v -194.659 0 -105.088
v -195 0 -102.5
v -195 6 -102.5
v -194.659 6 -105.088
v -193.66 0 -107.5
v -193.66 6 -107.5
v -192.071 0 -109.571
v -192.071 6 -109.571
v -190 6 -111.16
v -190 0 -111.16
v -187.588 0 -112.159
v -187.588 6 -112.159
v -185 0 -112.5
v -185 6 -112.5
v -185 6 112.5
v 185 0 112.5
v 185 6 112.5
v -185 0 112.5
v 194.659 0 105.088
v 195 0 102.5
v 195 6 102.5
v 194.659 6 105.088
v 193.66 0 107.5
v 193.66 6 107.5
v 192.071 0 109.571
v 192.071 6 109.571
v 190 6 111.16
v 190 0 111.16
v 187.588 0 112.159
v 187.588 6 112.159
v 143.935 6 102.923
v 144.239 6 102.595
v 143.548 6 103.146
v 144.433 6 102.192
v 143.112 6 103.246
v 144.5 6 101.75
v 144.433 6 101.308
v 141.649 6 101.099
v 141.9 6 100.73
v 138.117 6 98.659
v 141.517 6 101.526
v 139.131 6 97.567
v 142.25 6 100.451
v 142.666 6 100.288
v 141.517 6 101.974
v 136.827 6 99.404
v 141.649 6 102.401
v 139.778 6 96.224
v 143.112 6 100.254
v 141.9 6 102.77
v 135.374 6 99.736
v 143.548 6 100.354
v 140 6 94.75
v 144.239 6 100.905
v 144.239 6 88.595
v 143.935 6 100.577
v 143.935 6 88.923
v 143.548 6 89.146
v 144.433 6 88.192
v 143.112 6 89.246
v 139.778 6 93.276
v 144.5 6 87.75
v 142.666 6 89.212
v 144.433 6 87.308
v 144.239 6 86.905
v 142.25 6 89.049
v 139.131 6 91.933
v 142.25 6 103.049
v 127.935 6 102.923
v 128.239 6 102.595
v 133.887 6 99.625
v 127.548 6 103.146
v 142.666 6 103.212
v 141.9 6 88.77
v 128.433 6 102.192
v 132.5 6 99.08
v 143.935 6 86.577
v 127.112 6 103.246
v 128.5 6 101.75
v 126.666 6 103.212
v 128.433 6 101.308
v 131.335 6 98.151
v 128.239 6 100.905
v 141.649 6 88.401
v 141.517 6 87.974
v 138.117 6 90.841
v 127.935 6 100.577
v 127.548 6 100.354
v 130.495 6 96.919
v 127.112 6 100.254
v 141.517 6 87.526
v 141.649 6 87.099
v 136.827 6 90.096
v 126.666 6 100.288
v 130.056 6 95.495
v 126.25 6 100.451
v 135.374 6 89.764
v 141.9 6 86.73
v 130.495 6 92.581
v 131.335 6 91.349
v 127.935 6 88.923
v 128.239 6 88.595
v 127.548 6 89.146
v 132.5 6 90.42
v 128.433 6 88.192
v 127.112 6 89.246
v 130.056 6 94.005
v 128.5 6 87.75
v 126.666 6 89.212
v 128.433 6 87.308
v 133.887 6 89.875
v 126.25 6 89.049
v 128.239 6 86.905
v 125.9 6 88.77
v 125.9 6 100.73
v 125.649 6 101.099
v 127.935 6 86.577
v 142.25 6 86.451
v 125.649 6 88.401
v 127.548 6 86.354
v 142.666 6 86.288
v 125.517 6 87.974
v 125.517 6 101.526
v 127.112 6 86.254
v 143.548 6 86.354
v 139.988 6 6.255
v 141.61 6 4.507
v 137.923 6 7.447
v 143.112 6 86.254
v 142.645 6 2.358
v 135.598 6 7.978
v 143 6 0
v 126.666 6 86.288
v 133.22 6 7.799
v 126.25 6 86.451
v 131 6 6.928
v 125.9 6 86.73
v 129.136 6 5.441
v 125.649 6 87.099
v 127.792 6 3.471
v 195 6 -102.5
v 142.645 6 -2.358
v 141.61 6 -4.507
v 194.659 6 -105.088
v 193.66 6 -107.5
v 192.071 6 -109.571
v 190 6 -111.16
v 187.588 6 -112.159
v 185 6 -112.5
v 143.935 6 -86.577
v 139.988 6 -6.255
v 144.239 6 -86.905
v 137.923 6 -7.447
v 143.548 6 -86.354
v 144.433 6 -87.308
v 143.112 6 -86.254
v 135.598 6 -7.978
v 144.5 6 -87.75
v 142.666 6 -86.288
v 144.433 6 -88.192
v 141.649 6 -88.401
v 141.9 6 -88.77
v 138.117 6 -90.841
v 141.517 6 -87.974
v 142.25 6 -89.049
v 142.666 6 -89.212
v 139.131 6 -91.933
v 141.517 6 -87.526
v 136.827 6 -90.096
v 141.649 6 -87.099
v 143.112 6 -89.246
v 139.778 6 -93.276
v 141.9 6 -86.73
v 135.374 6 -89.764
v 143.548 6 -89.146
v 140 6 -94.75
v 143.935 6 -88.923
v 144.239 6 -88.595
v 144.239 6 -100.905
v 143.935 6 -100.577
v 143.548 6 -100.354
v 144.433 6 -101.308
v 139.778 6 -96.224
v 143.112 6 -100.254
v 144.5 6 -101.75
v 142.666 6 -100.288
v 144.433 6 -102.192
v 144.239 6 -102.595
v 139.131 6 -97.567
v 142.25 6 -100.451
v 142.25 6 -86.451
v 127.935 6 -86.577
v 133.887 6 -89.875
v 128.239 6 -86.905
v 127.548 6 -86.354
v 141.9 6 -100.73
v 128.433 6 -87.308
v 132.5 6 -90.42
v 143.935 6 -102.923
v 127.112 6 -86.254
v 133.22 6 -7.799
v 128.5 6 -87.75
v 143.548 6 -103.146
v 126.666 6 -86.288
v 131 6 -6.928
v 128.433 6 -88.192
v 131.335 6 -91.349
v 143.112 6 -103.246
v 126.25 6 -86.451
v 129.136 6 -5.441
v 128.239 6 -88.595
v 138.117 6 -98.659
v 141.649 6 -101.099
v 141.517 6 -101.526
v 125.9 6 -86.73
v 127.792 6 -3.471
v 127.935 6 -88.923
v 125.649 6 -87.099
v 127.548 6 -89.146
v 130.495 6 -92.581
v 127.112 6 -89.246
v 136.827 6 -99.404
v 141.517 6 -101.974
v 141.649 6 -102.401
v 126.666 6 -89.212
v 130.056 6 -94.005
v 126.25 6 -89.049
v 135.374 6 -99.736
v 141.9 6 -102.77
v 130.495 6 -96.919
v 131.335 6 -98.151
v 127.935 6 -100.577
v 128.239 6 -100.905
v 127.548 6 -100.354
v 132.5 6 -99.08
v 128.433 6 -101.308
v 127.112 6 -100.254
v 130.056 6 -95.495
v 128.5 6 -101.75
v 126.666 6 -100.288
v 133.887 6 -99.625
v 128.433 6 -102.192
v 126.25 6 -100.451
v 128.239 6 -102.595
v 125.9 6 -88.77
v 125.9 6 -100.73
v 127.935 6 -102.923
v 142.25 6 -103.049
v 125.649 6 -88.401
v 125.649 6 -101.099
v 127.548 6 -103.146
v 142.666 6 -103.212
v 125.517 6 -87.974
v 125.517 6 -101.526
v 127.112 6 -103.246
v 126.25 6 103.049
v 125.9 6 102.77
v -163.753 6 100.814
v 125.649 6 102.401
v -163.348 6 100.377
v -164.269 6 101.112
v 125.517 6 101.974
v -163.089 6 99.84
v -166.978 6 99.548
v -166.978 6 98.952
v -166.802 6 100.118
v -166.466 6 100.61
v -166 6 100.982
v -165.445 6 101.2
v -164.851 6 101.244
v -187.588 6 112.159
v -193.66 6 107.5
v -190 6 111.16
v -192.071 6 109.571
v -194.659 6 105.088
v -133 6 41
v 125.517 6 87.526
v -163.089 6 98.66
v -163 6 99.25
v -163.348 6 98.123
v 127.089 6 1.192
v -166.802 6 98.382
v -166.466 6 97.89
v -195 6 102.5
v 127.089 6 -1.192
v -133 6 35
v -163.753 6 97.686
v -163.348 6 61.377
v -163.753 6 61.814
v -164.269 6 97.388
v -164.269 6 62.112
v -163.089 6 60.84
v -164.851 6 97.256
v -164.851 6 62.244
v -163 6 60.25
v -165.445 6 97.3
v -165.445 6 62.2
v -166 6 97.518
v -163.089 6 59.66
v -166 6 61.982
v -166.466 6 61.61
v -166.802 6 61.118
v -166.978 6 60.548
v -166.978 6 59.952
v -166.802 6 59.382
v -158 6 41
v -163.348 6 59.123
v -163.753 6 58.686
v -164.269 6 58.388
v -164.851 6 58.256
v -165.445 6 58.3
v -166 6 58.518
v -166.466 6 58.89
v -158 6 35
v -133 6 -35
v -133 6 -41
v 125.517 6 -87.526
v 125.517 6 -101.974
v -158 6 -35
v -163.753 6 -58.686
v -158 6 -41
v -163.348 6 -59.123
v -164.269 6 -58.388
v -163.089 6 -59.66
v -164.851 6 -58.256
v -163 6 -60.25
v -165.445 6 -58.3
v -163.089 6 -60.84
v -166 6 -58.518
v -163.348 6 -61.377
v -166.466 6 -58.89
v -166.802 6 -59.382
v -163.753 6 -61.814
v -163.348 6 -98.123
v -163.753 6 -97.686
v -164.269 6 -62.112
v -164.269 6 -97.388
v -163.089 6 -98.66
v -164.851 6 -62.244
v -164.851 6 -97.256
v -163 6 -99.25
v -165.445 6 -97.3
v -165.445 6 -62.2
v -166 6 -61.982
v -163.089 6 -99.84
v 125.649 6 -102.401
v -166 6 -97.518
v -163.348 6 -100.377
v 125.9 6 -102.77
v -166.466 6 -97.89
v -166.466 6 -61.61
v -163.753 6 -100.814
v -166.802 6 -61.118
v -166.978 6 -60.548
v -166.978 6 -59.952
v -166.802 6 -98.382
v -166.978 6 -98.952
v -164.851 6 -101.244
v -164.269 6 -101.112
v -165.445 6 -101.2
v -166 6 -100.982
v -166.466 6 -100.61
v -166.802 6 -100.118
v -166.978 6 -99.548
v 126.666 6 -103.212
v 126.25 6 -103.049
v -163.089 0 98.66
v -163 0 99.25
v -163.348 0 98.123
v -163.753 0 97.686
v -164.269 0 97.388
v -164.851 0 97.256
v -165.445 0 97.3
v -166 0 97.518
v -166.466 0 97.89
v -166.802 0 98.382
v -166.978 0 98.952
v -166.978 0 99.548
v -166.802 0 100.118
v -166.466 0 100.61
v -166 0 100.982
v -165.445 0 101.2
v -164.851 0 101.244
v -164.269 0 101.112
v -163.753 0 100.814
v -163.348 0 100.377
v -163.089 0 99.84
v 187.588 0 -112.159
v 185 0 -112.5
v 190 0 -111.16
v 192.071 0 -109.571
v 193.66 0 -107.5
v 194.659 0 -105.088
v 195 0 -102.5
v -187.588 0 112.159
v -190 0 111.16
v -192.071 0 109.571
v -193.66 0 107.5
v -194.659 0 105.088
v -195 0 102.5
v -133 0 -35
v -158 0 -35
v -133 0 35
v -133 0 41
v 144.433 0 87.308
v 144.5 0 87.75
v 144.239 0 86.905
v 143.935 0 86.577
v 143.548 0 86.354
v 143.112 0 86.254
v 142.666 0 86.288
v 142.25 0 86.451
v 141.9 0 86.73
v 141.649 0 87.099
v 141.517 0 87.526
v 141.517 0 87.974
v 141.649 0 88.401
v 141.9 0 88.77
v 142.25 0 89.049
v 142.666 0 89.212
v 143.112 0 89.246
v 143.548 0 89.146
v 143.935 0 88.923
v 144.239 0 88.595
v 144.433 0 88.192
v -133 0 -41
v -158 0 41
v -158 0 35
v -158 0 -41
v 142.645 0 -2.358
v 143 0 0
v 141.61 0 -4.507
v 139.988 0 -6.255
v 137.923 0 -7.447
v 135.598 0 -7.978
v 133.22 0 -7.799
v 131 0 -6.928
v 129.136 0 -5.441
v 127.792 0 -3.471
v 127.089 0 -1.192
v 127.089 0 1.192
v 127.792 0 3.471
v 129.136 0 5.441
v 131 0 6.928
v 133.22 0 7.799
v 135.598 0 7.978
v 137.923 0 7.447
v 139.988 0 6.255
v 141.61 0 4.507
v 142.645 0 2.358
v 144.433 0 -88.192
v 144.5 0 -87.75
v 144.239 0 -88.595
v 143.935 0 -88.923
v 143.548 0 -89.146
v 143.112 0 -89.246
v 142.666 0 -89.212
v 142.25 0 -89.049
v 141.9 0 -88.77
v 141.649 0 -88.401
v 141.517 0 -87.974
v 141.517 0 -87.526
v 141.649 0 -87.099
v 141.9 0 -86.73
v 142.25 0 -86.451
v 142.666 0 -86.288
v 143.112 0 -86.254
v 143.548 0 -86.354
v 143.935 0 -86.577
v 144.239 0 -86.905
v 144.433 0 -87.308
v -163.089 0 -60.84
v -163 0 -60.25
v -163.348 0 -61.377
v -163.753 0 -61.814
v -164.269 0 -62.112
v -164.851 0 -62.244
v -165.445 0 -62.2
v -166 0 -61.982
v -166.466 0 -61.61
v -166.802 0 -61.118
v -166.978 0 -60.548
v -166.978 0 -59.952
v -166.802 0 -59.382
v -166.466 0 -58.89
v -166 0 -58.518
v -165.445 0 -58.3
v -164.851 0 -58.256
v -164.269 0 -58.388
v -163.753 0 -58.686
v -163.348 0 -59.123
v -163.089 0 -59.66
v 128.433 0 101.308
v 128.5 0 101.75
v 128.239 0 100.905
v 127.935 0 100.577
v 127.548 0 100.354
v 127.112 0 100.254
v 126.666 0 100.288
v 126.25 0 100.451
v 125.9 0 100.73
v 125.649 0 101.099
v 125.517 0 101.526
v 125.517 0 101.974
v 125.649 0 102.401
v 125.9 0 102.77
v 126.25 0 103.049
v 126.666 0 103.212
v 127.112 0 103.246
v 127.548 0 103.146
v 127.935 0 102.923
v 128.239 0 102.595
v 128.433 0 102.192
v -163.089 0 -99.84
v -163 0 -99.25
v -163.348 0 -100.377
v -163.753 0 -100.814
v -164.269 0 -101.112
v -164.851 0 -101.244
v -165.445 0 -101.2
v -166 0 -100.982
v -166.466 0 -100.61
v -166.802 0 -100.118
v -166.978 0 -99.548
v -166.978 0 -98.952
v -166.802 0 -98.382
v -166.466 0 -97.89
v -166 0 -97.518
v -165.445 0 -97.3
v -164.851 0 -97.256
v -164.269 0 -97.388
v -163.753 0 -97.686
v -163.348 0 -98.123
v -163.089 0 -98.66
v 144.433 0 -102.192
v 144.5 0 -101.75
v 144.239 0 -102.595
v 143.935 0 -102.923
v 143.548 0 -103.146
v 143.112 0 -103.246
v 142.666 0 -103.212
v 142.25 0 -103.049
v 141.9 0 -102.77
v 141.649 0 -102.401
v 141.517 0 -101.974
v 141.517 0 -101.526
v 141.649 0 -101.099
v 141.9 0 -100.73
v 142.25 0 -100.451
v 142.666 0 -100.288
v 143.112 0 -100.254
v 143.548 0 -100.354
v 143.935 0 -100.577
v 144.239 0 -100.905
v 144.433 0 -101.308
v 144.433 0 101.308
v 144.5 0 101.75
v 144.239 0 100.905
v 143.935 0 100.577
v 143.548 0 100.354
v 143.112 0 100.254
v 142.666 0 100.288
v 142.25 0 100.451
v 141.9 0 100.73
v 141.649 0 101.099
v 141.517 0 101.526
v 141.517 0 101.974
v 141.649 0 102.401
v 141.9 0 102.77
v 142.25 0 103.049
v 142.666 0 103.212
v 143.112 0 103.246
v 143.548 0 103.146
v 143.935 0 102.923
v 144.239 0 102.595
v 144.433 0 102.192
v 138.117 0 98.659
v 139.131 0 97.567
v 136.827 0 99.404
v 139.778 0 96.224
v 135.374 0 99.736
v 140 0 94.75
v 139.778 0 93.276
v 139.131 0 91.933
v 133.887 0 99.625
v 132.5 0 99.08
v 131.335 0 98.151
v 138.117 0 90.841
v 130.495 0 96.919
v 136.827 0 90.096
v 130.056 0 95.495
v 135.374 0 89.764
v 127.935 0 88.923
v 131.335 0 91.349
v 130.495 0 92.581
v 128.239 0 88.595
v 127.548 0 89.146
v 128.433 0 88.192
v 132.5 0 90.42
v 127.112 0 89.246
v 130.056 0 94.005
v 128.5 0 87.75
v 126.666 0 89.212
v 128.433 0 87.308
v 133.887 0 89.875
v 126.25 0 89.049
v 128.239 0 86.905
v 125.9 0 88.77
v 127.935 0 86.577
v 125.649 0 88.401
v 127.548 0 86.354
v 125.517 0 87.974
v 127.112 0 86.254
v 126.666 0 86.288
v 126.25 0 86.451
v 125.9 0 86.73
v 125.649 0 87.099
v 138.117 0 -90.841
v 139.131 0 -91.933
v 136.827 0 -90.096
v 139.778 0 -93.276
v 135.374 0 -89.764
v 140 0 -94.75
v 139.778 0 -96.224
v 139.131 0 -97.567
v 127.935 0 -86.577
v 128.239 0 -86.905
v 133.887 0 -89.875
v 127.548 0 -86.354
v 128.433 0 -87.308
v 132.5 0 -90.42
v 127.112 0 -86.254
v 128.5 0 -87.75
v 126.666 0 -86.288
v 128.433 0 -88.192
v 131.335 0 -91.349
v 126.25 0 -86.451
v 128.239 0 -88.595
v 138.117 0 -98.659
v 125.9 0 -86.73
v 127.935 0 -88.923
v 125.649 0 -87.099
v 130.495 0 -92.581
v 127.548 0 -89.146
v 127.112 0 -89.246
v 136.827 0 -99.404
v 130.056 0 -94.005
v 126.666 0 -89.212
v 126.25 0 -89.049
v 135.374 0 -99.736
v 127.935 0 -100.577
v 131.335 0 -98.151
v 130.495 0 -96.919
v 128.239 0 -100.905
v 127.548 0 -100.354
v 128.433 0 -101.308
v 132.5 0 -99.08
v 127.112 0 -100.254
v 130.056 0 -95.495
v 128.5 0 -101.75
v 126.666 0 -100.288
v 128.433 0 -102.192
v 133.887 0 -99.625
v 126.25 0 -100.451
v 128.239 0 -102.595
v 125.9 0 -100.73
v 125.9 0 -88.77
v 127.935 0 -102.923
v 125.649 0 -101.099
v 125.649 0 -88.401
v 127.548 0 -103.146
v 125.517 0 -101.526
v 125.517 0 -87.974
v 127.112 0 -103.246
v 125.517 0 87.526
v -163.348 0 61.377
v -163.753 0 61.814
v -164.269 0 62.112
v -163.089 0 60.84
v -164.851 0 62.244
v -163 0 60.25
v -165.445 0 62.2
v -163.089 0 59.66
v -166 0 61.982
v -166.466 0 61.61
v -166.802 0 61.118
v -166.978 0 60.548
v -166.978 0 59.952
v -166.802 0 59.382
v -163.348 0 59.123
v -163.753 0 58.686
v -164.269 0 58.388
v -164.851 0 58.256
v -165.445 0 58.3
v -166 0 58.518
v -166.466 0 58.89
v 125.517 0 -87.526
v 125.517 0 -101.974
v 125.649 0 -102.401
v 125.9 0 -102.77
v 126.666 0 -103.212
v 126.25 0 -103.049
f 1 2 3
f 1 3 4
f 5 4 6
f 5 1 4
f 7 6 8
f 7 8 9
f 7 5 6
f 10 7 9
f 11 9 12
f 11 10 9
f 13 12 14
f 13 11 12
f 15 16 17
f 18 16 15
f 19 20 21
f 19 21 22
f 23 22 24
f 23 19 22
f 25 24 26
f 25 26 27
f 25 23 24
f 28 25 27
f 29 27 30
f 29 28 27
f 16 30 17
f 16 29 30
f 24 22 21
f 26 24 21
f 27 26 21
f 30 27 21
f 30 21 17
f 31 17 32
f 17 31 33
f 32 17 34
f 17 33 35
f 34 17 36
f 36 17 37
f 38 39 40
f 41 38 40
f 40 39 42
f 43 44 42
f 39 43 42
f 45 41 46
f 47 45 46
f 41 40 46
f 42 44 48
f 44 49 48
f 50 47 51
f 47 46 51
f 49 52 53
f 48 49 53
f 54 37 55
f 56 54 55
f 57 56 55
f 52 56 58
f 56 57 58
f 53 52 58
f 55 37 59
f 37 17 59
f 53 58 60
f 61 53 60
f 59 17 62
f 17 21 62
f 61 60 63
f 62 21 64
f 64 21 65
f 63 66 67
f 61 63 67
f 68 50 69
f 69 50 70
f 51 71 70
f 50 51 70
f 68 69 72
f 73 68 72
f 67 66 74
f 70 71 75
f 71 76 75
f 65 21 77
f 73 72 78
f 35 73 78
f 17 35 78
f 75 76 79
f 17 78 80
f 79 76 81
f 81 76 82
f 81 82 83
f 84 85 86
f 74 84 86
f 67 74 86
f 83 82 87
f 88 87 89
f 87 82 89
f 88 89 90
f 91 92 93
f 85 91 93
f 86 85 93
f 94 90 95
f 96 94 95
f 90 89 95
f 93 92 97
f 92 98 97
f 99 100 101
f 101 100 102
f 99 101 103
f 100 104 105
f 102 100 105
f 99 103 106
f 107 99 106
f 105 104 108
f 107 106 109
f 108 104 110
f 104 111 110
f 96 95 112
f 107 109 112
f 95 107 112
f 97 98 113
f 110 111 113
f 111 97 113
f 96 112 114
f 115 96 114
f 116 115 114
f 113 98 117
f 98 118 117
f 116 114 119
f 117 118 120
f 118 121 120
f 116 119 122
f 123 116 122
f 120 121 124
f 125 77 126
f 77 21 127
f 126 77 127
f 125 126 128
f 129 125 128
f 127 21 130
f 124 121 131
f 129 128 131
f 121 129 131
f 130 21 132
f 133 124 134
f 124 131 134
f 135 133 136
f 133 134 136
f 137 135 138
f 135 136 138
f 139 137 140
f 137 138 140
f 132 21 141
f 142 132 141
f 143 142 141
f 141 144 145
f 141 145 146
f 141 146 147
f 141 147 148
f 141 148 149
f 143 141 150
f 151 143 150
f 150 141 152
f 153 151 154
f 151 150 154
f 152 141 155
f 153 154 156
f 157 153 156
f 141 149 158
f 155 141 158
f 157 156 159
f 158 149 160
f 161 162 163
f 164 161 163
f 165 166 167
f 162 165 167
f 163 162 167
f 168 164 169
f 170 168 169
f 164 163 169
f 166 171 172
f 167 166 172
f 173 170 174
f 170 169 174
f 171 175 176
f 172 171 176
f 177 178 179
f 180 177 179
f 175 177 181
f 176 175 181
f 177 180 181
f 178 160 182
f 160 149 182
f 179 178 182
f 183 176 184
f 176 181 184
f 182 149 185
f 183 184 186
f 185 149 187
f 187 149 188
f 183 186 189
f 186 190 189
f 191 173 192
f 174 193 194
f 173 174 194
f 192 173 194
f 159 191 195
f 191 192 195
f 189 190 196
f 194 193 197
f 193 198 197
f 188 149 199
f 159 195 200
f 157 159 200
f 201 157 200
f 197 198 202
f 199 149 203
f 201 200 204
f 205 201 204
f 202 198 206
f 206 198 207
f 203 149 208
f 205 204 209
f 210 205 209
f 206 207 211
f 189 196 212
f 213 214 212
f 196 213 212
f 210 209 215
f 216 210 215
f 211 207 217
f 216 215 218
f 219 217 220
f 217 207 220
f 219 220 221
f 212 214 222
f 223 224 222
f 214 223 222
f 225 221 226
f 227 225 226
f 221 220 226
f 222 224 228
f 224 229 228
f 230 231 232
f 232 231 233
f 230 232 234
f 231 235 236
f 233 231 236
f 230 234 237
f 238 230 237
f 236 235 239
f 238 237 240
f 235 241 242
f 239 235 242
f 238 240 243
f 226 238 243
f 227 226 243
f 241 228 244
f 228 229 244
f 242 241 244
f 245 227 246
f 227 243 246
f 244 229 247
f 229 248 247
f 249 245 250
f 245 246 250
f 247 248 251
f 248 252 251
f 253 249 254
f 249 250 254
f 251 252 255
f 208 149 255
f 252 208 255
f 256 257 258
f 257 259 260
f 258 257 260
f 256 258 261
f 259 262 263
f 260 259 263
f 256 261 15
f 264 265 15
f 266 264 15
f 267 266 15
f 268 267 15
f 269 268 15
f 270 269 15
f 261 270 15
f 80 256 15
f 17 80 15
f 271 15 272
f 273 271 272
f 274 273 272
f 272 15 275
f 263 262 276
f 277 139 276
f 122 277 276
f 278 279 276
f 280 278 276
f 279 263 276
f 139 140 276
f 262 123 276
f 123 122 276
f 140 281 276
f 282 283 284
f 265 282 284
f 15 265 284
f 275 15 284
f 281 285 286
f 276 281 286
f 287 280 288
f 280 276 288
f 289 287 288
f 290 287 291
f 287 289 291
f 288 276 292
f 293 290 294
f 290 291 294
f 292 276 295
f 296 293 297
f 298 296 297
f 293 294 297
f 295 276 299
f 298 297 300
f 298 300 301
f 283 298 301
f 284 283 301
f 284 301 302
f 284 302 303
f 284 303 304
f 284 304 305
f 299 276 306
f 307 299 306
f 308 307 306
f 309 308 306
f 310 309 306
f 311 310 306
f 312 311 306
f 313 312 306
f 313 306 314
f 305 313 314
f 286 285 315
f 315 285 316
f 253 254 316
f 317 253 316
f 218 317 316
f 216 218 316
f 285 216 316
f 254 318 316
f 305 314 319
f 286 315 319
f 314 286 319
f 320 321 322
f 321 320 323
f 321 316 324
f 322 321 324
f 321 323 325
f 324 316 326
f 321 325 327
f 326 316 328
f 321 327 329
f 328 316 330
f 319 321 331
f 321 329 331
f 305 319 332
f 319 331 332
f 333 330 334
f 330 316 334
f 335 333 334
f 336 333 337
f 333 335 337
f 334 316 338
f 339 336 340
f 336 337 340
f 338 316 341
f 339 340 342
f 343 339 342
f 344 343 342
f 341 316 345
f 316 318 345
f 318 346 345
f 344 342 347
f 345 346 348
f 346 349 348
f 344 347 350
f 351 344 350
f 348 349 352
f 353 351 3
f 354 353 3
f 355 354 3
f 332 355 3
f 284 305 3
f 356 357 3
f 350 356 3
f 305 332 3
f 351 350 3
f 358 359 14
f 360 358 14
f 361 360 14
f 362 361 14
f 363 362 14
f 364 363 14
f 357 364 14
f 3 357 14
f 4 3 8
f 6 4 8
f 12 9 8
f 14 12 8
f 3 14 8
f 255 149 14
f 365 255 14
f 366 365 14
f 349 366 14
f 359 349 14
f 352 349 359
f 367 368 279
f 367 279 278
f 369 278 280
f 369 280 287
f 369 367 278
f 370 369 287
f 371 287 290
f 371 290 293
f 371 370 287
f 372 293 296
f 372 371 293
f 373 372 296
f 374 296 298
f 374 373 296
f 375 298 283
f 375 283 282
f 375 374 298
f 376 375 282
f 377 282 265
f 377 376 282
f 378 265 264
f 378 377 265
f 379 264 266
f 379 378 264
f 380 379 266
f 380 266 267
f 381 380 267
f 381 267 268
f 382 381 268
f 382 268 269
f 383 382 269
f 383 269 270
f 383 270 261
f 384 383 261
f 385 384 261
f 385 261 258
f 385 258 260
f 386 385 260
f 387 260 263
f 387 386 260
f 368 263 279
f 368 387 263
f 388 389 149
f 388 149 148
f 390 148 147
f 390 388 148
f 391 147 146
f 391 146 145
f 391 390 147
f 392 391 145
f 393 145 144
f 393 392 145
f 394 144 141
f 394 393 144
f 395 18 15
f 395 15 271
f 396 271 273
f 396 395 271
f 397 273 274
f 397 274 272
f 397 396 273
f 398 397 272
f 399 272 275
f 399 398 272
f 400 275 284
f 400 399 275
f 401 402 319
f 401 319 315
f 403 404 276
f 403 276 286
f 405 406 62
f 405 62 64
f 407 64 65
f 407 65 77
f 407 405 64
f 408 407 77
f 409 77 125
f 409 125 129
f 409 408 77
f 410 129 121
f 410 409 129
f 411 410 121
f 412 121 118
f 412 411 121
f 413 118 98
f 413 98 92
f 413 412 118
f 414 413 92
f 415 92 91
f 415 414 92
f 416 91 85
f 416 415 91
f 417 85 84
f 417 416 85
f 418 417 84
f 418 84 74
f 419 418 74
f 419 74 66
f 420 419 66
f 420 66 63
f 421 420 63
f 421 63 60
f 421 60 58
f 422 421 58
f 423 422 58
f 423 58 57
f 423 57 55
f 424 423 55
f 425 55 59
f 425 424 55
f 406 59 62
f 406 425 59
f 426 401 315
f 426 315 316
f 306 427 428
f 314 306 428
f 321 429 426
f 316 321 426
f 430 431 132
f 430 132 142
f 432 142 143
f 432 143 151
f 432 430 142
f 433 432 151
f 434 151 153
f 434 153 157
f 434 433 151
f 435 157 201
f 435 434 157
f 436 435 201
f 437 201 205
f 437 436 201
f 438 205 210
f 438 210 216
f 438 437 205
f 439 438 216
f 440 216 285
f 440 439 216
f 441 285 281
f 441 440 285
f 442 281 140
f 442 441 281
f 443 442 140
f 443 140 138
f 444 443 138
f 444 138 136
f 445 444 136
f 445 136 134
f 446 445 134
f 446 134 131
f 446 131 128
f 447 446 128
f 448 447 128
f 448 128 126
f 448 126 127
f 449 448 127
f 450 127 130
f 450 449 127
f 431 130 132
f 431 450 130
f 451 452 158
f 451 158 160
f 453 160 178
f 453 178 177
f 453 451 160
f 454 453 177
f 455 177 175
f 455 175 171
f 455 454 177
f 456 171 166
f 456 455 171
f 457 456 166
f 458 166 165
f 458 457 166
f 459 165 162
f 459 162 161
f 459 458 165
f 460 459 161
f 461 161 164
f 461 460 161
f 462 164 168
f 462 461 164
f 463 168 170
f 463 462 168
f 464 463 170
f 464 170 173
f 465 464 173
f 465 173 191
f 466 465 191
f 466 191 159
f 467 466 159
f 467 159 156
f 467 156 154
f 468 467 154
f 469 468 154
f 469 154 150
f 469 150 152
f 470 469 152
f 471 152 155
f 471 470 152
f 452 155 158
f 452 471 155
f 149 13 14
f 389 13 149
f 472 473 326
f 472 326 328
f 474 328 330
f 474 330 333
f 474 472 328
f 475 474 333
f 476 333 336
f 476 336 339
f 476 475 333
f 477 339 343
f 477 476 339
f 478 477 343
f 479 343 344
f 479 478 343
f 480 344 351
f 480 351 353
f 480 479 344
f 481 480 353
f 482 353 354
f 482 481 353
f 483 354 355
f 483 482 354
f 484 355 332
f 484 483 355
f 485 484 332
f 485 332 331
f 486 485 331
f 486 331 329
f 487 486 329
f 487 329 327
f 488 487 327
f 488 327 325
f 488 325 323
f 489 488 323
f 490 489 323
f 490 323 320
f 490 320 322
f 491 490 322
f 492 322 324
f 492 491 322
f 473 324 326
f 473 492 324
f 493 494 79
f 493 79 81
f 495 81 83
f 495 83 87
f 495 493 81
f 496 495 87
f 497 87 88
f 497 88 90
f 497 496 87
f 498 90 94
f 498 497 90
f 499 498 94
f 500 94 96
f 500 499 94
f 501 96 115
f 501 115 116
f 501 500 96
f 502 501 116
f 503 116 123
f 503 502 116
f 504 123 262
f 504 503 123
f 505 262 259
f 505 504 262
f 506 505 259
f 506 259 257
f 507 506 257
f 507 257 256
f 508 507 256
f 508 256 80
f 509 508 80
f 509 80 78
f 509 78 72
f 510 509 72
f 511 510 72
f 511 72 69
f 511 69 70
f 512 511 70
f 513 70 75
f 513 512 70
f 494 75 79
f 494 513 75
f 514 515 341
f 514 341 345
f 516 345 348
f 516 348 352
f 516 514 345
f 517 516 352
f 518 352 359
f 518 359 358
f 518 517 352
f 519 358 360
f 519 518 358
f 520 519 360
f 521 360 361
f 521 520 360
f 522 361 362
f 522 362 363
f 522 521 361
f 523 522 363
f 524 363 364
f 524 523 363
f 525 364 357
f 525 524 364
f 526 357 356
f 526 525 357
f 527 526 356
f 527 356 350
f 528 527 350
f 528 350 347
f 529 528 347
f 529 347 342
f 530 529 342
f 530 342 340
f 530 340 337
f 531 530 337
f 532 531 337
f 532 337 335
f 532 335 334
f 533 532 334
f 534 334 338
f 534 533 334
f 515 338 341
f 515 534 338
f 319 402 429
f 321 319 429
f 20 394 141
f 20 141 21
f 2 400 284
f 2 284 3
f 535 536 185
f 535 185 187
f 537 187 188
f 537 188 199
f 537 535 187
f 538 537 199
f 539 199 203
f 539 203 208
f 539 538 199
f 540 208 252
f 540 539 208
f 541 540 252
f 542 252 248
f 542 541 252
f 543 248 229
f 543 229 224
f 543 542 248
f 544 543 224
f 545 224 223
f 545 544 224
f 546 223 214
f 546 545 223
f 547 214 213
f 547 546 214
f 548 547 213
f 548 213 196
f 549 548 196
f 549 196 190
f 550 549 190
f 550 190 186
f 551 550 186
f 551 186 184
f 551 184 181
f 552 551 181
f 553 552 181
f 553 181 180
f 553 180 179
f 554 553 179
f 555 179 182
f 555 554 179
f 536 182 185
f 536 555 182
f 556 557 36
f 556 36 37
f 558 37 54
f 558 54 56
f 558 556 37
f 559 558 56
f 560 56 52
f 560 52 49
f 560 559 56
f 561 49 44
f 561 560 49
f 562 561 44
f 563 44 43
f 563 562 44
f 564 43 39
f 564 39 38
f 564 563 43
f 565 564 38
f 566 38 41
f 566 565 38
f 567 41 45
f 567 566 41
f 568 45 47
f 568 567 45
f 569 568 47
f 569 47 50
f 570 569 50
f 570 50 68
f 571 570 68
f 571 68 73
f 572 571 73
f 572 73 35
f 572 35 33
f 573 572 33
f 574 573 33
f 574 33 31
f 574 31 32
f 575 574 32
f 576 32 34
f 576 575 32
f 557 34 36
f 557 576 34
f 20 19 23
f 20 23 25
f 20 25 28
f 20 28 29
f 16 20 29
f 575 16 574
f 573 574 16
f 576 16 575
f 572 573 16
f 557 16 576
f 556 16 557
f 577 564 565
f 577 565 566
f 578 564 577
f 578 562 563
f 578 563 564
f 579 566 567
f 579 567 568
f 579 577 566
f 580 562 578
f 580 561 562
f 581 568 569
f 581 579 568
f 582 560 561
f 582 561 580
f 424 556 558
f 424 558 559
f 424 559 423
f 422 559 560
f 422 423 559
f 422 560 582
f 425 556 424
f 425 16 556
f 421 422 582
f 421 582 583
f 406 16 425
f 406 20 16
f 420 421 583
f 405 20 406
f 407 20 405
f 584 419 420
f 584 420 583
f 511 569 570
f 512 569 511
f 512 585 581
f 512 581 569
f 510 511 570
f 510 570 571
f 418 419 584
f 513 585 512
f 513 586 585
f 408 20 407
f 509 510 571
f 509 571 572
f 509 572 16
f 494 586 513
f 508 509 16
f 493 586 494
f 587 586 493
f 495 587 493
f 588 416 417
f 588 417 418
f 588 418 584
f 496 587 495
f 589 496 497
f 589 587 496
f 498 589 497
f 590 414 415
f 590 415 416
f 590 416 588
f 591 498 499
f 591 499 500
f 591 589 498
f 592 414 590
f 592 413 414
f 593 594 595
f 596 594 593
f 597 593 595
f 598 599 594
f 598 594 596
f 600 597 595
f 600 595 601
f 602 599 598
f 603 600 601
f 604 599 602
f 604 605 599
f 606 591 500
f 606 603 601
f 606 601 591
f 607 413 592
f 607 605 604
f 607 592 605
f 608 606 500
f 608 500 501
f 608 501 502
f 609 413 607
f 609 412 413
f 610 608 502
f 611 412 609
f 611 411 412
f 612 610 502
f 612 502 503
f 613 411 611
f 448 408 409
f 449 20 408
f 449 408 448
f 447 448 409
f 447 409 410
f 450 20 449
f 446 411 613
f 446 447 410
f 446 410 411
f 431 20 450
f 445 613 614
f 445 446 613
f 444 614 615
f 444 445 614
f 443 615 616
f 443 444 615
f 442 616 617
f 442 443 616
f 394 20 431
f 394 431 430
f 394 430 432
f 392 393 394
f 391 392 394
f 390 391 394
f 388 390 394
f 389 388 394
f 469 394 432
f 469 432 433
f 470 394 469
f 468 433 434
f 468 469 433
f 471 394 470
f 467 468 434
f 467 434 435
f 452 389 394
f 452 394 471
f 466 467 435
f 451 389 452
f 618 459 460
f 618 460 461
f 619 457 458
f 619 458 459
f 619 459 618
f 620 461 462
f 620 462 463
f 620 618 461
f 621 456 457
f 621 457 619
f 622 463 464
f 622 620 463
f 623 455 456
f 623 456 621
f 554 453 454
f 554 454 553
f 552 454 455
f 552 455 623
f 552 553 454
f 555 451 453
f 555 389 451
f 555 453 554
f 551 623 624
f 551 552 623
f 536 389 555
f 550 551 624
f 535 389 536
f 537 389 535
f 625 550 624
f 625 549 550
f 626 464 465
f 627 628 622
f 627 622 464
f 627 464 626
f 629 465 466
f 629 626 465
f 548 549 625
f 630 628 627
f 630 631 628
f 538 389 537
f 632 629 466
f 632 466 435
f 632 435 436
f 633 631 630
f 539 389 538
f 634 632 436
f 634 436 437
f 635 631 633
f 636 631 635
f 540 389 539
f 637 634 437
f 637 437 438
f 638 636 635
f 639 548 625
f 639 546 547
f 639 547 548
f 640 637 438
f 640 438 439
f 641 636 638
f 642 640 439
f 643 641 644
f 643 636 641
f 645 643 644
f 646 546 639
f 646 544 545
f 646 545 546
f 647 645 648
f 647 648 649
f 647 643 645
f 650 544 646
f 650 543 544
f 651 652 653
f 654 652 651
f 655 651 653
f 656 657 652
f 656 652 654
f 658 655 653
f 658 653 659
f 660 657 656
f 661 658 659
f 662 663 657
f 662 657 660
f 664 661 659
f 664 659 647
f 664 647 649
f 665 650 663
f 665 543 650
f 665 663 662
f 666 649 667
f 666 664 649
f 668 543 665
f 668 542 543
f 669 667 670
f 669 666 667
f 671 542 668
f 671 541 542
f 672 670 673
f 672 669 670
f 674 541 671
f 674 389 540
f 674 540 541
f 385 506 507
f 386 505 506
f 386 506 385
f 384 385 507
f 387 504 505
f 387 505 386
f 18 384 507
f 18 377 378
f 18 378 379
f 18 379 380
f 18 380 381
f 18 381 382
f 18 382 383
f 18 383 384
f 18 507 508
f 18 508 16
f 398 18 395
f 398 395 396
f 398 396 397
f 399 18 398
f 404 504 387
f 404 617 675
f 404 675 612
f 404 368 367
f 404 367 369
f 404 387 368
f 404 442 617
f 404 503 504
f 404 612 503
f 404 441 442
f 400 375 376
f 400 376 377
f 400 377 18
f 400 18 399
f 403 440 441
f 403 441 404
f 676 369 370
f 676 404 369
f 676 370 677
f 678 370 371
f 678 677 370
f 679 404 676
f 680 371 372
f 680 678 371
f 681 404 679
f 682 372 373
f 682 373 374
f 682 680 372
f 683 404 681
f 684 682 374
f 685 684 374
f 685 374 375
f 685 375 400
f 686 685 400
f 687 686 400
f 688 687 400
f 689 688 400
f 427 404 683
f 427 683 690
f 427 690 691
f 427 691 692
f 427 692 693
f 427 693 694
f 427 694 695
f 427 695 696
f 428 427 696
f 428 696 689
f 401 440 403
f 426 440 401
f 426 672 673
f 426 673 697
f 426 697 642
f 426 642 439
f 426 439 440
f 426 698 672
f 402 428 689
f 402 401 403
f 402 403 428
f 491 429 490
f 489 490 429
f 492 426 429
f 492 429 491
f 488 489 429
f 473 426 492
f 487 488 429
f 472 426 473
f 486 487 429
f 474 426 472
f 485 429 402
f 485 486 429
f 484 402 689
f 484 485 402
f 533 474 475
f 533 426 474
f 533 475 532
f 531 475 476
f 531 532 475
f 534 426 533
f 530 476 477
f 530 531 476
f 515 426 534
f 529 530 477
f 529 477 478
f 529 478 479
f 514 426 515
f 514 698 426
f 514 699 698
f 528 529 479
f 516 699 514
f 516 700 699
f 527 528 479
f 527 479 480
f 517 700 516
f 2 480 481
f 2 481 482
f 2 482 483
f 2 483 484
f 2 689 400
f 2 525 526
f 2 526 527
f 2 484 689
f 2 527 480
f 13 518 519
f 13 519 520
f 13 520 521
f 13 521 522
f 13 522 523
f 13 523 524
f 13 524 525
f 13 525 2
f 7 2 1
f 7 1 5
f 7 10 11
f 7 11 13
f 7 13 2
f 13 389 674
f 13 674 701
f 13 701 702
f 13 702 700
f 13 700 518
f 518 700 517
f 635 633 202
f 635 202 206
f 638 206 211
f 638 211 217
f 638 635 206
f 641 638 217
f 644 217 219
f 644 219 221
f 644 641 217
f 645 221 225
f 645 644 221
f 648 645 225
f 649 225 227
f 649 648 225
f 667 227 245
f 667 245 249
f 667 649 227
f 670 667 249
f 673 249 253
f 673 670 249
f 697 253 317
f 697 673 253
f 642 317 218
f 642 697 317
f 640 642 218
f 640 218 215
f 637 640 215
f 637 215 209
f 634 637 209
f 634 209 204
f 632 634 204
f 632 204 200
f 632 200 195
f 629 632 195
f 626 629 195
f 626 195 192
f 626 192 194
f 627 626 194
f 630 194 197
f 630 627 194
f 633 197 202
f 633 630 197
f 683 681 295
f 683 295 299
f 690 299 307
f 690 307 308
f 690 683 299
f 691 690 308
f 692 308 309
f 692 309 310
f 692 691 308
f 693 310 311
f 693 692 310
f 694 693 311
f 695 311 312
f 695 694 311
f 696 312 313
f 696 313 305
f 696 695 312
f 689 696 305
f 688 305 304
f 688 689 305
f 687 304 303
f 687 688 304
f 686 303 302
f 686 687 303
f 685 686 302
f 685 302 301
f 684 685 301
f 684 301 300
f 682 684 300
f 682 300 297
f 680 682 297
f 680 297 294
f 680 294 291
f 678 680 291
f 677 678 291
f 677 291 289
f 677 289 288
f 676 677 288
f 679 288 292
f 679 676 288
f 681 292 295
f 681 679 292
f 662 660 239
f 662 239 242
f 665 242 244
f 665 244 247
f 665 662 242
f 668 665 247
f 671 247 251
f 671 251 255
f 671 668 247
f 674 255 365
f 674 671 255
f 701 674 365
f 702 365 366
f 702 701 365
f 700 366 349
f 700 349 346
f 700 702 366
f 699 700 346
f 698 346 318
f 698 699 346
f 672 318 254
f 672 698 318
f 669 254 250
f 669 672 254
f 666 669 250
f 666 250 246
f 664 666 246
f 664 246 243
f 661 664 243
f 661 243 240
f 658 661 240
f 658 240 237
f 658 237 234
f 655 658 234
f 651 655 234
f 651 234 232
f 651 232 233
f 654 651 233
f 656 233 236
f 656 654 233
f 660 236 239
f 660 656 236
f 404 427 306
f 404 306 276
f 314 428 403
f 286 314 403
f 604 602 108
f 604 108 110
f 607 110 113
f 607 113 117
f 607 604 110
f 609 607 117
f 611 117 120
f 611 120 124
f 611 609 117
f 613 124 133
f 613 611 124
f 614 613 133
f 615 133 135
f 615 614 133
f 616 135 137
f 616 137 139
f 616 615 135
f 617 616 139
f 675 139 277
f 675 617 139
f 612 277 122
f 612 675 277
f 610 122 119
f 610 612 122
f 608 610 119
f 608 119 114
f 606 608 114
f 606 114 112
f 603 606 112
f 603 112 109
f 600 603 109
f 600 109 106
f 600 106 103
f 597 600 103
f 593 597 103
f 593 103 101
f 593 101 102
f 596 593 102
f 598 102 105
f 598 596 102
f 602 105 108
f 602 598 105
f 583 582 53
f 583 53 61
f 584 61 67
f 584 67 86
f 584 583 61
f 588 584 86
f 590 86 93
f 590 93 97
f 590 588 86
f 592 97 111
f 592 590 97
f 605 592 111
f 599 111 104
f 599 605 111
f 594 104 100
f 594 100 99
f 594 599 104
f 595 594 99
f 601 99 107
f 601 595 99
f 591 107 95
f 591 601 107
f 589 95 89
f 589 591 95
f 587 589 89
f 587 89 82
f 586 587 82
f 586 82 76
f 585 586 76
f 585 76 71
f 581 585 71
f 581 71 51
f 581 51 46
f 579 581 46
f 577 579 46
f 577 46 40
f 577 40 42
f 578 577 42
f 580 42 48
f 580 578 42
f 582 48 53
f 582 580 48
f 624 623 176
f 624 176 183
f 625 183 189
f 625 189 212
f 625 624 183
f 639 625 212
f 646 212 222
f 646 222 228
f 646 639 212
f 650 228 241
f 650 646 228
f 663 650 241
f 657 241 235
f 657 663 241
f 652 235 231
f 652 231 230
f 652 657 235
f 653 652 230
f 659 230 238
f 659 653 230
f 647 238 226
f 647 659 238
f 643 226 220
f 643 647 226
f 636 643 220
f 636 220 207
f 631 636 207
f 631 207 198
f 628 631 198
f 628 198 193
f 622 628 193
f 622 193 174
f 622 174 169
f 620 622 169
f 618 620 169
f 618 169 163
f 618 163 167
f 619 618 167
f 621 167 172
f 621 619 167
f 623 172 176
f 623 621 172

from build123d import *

# Parameters (mm, degrees)
SKETCH1_R           = 8
SKETCH1_R_2         = 5
SKETCH1_R_3         = 1.5
SKETCH1_R_4         = 2
SKETCH1_W           = 25
SKETCH1_H           = 6
BOSS_EXTRUDE1_DEPTH = 6


with BuildPart() as part:
    # Sketch1 → Boss-Extrude1 (new body)
    with BuildSketch(Plane(origin=(0, 0, 0), x_dir=(1, 0, 0), z_dir=(0, 1, 0))):
        with BuildLine():
            Line((-185, 112.5), (185, 112.5))
            ThreePointArc((185, 112.5), (192.071067812, 109.571067812), (195, 102.5))
            Line((195, 102.5), (195, -102.5))
            ThreePointArc((195, -102.5), (192.071067812, -109.571067812), (185, -112.5))
            Line((185, -112.5), (-185, -112.5))
            ThreePointArc((-185, -112.5), (-192.071067812, -109.571067812), (-195, -102.5))
            Line((-195, -102.5), (-195, 102.5))
            ThreePointArc((-195, 102.5), (-192.071067812, 109.571067812), (-185, 112.5))
        make_face()
        with Locations((135, 0)):
            Circle(SKETCH1_R, mode=Mode.SUBTRACT)
        with Locations((135, -94.75)):
            Circle(SKETCH1_R_2, mode=Mode.SUBTRACT)
        with Locations((143, -87.75)):
            Circle(SKETCH1_R_3, mode=Mode.SUBTRACT)
        with Locations((143, -101.75)):
            Circle(SKETCH1_R_3, mode=Mode.SUBTRACT)
        with Locations((127, -87.75)):
            Circle(SKETCH1_R_3, mode=Mode.SUBTRACT)
        with Locations((127, -101.75)):
            Circle(SKETCH1_R_3, mode=Mode.SUBTRACT)
        with Locations((143, 101.75)):
            Circle(SKETCH1_R_3, mode=Mode.SUBTRACT)
        with Locations((143, 87.75)):
            Circle(SKETCH1_R_3, mode=Mode.SUBTRACT)
        with Locations((127, 101.75)):
            Circle(SKETCH1_R_3, mode=Mode.SUBTRACT)
        with Locations((127, 87.75)):
            Circle(SKETCH1_R_3, mode=Mode.SUBTRACT)
        with Locations((135, 94.75)):
            Circle(SKETCH1_R_2, mode=Mode.SUBTRACT)
        with Locations((-165, -60.25)):
            Circle(SKETCH1_R_4, mode=Mode.SUBTRACT)
        with Locations((-165, -99.25)):
            Circle(SKETCH1_R_4, mode=Mode.SUBTRACT)
        with Locations((-165, 60.25)):
            Circle(SKETCH1_R_4, mode=Mode.SUBTRACT)
        with Locations((-165, 99.25)):
            Circle(SKETCH1_R_4, mode=Mode.SUBTRACT)
        with Locations((-145.5, 38)):
            Rectangle(SKETCH1_W, SKETCH1_H, mode=Mode.SUBTRACT)
        with Locations((-145.5, -38)):
            Rectangle(SKETCH1_W, SKETCH1_H, mode=Mode.SUBTRACT)
    extrude(amount=BOSS_EXTRUDE1_DEPTH)


solid = part.part
